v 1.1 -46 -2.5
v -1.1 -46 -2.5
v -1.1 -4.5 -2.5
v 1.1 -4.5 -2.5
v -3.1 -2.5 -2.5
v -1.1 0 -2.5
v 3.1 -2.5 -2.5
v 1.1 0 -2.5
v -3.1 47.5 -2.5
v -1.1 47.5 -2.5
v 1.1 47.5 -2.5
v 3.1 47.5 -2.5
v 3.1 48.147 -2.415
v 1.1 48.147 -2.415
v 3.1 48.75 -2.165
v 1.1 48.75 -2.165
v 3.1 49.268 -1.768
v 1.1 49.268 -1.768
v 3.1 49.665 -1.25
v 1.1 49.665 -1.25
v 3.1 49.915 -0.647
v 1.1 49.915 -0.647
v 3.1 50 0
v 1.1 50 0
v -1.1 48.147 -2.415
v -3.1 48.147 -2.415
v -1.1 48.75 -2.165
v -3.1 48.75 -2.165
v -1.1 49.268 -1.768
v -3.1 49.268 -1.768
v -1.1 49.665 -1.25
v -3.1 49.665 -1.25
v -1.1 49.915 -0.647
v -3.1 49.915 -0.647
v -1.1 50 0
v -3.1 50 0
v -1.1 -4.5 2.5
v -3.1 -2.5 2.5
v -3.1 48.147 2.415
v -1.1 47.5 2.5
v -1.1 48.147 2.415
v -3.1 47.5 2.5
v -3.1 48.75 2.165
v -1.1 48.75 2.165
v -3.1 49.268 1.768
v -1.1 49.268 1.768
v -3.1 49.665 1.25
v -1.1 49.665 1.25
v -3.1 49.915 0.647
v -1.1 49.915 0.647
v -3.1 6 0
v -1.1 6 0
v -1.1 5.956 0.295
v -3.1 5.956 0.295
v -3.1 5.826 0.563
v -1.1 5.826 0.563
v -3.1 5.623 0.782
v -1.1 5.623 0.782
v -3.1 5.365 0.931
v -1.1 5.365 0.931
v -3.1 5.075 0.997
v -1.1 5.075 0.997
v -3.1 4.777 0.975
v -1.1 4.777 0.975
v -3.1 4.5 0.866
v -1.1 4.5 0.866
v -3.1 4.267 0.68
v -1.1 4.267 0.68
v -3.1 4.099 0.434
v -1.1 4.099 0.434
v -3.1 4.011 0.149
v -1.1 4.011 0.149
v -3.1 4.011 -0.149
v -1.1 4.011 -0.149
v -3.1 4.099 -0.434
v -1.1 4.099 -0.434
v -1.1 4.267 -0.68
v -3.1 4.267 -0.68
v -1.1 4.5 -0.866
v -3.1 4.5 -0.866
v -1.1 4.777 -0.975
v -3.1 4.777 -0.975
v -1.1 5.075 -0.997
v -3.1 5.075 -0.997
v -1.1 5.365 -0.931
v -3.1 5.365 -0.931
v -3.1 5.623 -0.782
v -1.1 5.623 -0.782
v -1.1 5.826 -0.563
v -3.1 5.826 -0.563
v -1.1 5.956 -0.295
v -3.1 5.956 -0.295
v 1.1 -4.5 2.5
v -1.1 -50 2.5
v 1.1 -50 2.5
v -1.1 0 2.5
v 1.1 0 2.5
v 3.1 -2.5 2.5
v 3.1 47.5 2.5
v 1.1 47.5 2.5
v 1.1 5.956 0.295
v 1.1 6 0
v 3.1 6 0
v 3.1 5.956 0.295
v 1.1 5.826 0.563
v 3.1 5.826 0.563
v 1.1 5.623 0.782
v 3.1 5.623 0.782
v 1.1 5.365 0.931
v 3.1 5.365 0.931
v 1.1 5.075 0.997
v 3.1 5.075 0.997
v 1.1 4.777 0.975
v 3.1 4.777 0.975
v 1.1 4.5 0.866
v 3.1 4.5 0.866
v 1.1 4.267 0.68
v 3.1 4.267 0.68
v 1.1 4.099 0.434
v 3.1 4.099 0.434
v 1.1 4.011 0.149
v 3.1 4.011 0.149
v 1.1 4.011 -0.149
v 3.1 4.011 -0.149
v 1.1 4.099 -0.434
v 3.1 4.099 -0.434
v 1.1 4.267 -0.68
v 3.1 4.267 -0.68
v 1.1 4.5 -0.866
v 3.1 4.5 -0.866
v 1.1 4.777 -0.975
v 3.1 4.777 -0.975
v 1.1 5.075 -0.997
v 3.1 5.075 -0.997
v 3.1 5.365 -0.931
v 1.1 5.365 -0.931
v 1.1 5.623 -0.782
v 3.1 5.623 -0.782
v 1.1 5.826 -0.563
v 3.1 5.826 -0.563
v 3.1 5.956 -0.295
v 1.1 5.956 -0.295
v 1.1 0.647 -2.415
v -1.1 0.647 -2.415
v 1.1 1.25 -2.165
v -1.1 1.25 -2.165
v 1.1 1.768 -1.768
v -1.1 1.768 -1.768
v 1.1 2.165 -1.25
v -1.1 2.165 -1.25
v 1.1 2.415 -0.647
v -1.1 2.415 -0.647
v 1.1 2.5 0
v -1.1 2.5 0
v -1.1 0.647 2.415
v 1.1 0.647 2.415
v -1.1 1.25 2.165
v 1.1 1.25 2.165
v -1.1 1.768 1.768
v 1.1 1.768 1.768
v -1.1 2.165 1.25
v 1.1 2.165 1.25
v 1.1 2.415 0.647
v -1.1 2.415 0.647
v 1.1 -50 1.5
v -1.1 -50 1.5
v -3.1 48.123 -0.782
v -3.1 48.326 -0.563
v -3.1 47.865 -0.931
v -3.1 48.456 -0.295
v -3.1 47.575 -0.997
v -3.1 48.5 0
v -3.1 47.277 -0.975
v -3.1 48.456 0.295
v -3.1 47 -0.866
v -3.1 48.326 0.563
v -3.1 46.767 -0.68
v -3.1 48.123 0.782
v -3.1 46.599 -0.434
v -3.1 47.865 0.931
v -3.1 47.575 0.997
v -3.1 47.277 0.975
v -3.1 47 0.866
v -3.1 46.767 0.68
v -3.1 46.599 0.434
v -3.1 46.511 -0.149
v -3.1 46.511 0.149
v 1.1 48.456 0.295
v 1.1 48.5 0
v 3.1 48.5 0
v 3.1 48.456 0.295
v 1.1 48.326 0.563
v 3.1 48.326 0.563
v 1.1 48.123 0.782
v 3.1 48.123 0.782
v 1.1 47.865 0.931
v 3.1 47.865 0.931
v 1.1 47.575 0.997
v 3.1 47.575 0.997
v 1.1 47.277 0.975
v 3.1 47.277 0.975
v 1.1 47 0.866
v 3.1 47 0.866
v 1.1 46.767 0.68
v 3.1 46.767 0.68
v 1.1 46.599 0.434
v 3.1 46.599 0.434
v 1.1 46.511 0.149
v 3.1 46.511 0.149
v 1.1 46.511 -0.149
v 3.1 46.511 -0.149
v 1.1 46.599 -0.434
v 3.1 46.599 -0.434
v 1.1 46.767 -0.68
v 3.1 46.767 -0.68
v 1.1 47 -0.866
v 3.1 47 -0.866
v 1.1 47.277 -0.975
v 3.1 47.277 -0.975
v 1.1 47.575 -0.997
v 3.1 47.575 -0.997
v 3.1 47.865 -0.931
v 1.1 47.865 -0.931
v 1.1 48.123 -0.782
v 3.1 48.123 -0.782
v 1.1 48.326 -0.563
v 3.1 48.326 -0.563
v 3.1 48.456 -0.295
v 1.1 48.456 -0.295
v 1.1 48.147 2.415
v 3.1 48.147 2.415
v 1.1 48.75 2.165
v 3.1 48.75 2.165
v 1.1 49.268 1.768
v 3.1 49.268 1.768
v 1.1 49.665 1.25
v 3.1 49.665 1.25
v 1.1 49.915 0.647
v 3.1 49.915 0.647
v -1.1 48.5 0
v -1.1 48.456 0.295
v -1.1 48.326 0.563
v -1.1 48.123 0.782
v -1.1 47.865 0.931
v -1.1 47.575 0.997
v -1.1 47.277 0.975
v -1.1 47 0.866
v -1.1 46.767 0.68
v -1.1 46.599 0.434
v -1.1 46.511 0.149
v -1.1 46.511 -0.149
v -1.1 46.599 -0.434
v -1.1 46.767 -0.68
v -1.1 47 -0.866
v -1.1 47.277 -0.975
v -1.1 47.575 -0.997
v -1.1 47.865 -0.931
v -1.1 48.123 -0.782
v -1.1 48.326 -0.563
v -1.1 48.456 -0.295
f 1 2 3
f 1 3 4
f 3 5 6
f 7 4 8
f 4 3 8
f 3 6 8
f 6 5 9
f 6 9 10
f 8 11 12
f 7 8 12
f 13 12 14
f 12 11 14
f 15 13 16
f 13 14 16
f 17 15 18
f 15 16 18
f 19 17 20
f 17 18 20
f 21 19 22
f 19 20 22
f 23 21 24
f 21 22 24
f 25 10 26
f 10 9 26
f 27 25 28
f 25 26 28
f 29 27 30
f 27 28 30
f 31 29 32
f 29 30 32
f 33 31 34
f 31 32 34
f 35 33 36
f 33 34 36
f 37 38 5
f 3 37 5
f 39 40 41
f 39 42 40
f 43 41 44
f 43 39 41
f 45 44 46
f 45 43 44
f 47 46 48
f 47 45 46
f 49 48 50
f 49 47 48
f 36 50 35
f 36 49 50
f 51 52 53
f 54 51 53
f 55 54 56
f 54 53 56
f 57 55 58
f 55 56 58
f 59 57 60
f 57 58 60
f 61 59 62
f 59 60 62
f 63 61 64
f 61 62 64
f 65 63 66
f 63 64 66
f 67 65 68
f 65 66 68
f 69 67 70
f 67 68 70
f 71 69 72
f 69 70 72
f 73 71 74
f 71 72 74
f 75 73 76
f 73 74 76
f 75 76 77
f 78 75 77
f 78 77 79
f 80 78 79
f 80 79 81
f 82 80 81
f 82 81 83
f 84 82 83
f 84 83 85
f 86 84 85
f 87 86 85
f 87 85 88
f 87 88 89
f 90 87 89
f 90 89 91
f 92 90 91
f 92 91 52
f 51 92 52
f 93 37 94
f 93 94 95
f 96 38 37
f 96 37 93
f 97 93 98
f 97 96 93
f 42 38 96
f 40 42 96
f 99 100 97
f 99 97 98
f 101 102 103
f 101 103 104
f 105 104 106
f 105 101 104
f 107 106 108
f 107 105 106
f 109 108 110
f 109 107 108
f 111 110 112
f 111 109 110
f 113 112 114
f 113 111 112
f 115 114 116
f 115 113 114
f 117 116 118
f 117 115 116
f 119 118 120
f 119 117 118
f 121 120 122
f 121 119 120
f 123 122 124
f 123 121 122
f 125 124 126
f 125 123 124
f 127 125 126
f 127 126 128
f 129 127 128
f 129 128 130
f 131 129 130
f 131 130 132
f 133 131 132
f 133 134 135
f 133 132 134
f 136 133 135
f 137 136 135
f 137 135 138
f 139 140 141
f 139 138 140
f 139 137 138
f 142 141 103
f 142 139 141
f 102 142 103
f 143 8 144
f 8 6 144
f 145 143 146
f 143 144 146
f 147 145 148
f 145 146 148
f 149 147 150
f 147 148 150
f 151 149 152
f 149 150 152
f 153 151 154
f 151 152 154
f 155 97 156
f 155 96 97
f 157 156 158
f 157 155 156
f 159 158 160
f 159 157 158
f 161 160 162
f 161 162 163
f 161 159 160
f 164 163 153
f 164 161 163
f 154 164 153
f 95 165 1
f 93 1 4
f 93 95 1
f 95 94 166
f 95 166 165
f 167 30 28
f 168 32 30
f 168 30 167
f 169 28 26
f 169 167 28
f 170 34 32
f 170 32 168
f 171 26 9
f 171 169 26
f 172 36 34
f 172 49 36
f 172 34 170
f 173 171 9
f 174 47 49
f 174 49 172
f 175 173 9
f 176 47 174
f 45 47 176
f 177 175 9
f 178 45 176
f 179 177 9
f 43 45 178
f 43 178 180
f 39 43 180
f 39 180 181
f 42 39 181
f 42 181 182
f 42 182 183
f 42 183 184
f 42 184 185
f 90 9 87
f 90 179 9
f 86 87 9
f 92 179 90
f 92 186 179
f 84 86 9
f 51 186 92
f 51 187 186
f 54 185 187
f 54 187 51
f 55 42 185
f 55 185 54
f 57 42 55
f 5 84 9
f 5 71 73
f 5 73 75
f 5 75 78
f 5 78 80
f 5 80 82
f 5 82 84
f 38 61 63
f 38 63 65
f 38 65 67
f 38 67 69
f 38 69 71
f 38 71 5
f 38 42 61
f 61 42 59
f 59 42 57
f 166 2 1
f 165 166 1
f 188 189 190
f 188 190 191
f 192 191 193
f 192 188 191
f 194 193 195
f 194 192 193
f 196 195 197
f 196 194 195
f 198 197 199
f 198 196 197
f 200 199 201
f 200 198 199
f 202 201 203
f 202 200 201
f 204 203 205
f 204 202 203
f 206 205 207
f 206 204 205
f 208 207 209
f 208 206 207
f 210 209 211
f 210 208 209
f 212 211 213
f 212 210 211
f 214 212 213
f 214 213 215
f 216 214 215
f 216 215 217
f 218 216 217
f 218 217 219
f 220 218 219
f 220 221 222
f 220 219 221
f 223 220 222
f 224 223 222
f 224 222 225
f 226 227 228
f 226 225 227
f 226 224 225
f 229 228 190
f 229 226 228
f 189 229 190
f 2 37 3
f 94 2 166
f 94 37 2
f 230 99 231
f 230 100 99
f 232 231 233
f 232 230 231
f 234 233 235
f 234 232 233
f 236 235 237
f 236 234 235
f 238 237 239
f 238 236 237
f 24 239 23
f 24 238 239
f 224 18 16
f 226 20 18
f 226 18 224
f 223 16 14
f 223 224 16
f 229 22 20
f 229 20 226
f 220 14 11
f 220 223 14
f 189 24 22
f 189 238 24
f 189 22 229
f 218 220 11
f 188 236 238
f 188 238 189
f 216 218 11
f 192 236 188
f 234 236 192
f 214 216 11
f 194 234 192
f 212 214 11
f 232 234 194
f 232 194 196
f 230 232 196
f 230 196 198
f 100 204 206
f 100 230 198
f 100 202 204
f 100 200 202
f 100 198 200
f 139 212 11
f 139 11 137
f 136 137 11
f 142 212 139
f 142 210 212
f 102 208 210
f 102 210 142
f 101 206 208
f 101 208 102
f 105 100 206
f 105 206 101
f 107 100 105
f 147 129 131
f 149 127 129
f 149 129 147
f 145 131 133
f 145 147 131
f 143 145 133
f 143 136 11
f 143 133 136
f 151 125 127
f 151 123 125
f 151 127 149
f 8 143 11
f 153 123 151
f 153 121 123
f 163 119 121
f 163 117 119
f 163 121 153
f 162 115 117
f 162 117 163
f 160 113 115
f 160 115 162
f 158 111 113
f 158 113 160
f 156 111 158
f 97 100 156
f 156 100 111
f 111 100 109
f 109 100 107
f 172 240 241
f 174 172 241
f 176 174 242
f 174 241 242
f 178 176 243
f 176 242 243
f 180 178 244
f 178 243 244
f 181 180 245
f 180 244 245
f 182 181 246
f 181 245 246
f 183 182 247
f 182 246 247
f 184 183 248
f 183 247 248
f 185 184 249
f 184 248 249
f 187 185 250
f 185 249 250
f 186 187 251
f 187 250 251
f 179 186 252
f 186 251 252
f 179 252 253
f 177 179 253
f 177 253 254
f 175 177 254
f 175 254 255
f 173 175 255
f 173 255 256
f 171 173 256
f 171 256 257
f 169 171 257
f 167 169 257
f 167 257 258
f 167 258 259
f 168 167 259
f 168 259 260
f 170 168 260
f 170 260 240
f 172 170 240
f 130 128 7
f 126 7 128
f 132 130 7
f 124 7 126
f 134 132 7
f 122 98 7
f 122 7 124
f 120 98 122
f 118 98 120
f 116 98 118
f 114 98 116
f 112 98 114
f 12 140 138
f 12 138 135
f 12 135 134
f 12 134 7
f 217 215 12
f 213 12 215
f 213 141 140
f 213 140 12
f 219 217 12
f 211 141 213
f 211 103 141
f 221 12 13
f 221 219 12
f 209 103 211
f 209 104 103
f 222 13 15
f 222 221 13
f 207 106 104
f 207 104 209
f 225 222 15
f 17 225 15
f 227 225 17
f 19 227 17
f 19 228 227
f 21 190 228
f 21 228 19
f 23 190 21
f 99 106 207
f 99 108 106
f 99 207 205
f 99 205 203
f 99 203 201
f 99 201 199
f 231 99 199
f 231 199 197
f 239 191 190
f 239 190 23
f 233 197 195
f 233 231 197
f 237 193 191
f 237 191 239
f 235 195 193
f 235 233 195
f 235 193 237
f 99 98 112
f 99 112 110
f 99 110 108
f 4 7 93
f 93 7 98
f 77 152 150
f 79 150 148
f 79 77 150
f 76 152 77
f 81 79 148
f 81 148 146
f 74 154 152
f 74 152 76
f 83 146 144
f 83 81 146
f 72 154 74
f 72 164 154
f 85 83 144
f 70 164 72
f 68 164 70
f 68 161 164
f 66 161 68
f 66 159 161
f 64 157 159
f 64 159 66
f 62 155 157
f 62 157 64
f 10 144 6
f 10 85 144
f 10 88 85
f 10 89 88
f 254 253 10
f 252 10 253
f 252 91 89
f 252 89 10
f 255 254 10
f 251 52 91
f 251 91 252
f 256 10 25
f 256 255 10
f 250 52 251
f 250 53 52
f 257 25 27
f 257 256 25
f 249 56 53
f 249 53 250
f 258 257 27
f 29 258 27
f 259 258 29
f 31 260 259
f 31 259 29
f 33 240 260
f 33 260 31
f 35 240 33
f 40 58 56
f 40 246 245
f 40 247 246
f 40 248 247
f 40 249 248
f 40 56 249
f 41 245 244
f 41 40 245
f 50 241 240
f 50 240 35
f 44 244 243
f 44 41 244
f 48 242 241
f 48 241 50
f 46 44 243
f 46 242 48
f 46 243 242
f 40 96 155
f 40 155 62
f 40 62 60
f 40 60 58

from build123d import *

# Parameters (mm, degrees)
F1_DEPTH      = 2.5
F2_SIZE       = 4
F3_SIZE       = 1.99999
F4_R          = 2.49999
F5_R          = 1
F6_DEPTH      = 3.101
F6_DEPTH_BACK = 3.101


# Not quite as in the source:
# - a fillet or chamfer is up to 0.001 mm smaller than in the source, because OpenCascade refuses the exact size


with BuildPart() as f1:
    # F0 (on Top) → F1 (new body, symmetric)
    with BuildSketch(Plane.XY):
        Polygon((-1.1, -50), (0, -50), (1.1, -50), (1.1, -2.5), (3.1, -2.5), (3.1, 50), (1.1, 50), (1.1, 2.5), (0, 2.5), (-1.1, 2.5), (-1.1, 50), (-3.1, 50), (-3.1, -2.5), (-1.1, -2.5), align=None)
    extrude(amount=F1_DEPTH, both=True)

    # F2
    f2_edges = [f1.edges().sort_by_distance(p)[0] for p in [
        (0, -50, -2.5),
    ]]
    chamfer(f2_edges, length=F2_SIZE)

    # F3 (size 2 in the source; OpenCascade refuses exactly that, so slightly less here)
    f3_edges = [f1.edges().sort_by_distance(p)[0] for p in [
        (1.1, -2.5, 0),
        (-1.1, -2.5, 0),
    ]]
    chamfer(f3_edges, length=F3_SIZE)

    # F4 (radius 2.5 in the source; OpenCascade refuses exactly that, so slightly less here)
    f4_edges = [f1.edges().sort_by_distance(p)[0] for p in [
        (2.1, 50, 2.5),
        (-2.1, 50, 2.5),
        (-2.1, 50, -2.5),
        (2.1, 50, -2.5),
        (0, 2.5, -2.5),
        (0, 2.5, 2.5),
    ]]
    fillet(f4_edges, radius=F4_R)

    # F5 (on Right) → F6 (cut, two sides)
    with BuildSketch(Plane.YZ) as f6_sk:
        with Locations((5, 0)):
            Circle(F5_R)
        with Locations((47.5, 0)):
            Circle(F5_R)
    extrude(amount=-F6_DEPTH, mode=Mode.SUBTRACT)
    extrude(f6_sk.sketch, amount=F6_DEPTH_BACK, mode=Mode.SUBTRACT)


solid = f1.part
